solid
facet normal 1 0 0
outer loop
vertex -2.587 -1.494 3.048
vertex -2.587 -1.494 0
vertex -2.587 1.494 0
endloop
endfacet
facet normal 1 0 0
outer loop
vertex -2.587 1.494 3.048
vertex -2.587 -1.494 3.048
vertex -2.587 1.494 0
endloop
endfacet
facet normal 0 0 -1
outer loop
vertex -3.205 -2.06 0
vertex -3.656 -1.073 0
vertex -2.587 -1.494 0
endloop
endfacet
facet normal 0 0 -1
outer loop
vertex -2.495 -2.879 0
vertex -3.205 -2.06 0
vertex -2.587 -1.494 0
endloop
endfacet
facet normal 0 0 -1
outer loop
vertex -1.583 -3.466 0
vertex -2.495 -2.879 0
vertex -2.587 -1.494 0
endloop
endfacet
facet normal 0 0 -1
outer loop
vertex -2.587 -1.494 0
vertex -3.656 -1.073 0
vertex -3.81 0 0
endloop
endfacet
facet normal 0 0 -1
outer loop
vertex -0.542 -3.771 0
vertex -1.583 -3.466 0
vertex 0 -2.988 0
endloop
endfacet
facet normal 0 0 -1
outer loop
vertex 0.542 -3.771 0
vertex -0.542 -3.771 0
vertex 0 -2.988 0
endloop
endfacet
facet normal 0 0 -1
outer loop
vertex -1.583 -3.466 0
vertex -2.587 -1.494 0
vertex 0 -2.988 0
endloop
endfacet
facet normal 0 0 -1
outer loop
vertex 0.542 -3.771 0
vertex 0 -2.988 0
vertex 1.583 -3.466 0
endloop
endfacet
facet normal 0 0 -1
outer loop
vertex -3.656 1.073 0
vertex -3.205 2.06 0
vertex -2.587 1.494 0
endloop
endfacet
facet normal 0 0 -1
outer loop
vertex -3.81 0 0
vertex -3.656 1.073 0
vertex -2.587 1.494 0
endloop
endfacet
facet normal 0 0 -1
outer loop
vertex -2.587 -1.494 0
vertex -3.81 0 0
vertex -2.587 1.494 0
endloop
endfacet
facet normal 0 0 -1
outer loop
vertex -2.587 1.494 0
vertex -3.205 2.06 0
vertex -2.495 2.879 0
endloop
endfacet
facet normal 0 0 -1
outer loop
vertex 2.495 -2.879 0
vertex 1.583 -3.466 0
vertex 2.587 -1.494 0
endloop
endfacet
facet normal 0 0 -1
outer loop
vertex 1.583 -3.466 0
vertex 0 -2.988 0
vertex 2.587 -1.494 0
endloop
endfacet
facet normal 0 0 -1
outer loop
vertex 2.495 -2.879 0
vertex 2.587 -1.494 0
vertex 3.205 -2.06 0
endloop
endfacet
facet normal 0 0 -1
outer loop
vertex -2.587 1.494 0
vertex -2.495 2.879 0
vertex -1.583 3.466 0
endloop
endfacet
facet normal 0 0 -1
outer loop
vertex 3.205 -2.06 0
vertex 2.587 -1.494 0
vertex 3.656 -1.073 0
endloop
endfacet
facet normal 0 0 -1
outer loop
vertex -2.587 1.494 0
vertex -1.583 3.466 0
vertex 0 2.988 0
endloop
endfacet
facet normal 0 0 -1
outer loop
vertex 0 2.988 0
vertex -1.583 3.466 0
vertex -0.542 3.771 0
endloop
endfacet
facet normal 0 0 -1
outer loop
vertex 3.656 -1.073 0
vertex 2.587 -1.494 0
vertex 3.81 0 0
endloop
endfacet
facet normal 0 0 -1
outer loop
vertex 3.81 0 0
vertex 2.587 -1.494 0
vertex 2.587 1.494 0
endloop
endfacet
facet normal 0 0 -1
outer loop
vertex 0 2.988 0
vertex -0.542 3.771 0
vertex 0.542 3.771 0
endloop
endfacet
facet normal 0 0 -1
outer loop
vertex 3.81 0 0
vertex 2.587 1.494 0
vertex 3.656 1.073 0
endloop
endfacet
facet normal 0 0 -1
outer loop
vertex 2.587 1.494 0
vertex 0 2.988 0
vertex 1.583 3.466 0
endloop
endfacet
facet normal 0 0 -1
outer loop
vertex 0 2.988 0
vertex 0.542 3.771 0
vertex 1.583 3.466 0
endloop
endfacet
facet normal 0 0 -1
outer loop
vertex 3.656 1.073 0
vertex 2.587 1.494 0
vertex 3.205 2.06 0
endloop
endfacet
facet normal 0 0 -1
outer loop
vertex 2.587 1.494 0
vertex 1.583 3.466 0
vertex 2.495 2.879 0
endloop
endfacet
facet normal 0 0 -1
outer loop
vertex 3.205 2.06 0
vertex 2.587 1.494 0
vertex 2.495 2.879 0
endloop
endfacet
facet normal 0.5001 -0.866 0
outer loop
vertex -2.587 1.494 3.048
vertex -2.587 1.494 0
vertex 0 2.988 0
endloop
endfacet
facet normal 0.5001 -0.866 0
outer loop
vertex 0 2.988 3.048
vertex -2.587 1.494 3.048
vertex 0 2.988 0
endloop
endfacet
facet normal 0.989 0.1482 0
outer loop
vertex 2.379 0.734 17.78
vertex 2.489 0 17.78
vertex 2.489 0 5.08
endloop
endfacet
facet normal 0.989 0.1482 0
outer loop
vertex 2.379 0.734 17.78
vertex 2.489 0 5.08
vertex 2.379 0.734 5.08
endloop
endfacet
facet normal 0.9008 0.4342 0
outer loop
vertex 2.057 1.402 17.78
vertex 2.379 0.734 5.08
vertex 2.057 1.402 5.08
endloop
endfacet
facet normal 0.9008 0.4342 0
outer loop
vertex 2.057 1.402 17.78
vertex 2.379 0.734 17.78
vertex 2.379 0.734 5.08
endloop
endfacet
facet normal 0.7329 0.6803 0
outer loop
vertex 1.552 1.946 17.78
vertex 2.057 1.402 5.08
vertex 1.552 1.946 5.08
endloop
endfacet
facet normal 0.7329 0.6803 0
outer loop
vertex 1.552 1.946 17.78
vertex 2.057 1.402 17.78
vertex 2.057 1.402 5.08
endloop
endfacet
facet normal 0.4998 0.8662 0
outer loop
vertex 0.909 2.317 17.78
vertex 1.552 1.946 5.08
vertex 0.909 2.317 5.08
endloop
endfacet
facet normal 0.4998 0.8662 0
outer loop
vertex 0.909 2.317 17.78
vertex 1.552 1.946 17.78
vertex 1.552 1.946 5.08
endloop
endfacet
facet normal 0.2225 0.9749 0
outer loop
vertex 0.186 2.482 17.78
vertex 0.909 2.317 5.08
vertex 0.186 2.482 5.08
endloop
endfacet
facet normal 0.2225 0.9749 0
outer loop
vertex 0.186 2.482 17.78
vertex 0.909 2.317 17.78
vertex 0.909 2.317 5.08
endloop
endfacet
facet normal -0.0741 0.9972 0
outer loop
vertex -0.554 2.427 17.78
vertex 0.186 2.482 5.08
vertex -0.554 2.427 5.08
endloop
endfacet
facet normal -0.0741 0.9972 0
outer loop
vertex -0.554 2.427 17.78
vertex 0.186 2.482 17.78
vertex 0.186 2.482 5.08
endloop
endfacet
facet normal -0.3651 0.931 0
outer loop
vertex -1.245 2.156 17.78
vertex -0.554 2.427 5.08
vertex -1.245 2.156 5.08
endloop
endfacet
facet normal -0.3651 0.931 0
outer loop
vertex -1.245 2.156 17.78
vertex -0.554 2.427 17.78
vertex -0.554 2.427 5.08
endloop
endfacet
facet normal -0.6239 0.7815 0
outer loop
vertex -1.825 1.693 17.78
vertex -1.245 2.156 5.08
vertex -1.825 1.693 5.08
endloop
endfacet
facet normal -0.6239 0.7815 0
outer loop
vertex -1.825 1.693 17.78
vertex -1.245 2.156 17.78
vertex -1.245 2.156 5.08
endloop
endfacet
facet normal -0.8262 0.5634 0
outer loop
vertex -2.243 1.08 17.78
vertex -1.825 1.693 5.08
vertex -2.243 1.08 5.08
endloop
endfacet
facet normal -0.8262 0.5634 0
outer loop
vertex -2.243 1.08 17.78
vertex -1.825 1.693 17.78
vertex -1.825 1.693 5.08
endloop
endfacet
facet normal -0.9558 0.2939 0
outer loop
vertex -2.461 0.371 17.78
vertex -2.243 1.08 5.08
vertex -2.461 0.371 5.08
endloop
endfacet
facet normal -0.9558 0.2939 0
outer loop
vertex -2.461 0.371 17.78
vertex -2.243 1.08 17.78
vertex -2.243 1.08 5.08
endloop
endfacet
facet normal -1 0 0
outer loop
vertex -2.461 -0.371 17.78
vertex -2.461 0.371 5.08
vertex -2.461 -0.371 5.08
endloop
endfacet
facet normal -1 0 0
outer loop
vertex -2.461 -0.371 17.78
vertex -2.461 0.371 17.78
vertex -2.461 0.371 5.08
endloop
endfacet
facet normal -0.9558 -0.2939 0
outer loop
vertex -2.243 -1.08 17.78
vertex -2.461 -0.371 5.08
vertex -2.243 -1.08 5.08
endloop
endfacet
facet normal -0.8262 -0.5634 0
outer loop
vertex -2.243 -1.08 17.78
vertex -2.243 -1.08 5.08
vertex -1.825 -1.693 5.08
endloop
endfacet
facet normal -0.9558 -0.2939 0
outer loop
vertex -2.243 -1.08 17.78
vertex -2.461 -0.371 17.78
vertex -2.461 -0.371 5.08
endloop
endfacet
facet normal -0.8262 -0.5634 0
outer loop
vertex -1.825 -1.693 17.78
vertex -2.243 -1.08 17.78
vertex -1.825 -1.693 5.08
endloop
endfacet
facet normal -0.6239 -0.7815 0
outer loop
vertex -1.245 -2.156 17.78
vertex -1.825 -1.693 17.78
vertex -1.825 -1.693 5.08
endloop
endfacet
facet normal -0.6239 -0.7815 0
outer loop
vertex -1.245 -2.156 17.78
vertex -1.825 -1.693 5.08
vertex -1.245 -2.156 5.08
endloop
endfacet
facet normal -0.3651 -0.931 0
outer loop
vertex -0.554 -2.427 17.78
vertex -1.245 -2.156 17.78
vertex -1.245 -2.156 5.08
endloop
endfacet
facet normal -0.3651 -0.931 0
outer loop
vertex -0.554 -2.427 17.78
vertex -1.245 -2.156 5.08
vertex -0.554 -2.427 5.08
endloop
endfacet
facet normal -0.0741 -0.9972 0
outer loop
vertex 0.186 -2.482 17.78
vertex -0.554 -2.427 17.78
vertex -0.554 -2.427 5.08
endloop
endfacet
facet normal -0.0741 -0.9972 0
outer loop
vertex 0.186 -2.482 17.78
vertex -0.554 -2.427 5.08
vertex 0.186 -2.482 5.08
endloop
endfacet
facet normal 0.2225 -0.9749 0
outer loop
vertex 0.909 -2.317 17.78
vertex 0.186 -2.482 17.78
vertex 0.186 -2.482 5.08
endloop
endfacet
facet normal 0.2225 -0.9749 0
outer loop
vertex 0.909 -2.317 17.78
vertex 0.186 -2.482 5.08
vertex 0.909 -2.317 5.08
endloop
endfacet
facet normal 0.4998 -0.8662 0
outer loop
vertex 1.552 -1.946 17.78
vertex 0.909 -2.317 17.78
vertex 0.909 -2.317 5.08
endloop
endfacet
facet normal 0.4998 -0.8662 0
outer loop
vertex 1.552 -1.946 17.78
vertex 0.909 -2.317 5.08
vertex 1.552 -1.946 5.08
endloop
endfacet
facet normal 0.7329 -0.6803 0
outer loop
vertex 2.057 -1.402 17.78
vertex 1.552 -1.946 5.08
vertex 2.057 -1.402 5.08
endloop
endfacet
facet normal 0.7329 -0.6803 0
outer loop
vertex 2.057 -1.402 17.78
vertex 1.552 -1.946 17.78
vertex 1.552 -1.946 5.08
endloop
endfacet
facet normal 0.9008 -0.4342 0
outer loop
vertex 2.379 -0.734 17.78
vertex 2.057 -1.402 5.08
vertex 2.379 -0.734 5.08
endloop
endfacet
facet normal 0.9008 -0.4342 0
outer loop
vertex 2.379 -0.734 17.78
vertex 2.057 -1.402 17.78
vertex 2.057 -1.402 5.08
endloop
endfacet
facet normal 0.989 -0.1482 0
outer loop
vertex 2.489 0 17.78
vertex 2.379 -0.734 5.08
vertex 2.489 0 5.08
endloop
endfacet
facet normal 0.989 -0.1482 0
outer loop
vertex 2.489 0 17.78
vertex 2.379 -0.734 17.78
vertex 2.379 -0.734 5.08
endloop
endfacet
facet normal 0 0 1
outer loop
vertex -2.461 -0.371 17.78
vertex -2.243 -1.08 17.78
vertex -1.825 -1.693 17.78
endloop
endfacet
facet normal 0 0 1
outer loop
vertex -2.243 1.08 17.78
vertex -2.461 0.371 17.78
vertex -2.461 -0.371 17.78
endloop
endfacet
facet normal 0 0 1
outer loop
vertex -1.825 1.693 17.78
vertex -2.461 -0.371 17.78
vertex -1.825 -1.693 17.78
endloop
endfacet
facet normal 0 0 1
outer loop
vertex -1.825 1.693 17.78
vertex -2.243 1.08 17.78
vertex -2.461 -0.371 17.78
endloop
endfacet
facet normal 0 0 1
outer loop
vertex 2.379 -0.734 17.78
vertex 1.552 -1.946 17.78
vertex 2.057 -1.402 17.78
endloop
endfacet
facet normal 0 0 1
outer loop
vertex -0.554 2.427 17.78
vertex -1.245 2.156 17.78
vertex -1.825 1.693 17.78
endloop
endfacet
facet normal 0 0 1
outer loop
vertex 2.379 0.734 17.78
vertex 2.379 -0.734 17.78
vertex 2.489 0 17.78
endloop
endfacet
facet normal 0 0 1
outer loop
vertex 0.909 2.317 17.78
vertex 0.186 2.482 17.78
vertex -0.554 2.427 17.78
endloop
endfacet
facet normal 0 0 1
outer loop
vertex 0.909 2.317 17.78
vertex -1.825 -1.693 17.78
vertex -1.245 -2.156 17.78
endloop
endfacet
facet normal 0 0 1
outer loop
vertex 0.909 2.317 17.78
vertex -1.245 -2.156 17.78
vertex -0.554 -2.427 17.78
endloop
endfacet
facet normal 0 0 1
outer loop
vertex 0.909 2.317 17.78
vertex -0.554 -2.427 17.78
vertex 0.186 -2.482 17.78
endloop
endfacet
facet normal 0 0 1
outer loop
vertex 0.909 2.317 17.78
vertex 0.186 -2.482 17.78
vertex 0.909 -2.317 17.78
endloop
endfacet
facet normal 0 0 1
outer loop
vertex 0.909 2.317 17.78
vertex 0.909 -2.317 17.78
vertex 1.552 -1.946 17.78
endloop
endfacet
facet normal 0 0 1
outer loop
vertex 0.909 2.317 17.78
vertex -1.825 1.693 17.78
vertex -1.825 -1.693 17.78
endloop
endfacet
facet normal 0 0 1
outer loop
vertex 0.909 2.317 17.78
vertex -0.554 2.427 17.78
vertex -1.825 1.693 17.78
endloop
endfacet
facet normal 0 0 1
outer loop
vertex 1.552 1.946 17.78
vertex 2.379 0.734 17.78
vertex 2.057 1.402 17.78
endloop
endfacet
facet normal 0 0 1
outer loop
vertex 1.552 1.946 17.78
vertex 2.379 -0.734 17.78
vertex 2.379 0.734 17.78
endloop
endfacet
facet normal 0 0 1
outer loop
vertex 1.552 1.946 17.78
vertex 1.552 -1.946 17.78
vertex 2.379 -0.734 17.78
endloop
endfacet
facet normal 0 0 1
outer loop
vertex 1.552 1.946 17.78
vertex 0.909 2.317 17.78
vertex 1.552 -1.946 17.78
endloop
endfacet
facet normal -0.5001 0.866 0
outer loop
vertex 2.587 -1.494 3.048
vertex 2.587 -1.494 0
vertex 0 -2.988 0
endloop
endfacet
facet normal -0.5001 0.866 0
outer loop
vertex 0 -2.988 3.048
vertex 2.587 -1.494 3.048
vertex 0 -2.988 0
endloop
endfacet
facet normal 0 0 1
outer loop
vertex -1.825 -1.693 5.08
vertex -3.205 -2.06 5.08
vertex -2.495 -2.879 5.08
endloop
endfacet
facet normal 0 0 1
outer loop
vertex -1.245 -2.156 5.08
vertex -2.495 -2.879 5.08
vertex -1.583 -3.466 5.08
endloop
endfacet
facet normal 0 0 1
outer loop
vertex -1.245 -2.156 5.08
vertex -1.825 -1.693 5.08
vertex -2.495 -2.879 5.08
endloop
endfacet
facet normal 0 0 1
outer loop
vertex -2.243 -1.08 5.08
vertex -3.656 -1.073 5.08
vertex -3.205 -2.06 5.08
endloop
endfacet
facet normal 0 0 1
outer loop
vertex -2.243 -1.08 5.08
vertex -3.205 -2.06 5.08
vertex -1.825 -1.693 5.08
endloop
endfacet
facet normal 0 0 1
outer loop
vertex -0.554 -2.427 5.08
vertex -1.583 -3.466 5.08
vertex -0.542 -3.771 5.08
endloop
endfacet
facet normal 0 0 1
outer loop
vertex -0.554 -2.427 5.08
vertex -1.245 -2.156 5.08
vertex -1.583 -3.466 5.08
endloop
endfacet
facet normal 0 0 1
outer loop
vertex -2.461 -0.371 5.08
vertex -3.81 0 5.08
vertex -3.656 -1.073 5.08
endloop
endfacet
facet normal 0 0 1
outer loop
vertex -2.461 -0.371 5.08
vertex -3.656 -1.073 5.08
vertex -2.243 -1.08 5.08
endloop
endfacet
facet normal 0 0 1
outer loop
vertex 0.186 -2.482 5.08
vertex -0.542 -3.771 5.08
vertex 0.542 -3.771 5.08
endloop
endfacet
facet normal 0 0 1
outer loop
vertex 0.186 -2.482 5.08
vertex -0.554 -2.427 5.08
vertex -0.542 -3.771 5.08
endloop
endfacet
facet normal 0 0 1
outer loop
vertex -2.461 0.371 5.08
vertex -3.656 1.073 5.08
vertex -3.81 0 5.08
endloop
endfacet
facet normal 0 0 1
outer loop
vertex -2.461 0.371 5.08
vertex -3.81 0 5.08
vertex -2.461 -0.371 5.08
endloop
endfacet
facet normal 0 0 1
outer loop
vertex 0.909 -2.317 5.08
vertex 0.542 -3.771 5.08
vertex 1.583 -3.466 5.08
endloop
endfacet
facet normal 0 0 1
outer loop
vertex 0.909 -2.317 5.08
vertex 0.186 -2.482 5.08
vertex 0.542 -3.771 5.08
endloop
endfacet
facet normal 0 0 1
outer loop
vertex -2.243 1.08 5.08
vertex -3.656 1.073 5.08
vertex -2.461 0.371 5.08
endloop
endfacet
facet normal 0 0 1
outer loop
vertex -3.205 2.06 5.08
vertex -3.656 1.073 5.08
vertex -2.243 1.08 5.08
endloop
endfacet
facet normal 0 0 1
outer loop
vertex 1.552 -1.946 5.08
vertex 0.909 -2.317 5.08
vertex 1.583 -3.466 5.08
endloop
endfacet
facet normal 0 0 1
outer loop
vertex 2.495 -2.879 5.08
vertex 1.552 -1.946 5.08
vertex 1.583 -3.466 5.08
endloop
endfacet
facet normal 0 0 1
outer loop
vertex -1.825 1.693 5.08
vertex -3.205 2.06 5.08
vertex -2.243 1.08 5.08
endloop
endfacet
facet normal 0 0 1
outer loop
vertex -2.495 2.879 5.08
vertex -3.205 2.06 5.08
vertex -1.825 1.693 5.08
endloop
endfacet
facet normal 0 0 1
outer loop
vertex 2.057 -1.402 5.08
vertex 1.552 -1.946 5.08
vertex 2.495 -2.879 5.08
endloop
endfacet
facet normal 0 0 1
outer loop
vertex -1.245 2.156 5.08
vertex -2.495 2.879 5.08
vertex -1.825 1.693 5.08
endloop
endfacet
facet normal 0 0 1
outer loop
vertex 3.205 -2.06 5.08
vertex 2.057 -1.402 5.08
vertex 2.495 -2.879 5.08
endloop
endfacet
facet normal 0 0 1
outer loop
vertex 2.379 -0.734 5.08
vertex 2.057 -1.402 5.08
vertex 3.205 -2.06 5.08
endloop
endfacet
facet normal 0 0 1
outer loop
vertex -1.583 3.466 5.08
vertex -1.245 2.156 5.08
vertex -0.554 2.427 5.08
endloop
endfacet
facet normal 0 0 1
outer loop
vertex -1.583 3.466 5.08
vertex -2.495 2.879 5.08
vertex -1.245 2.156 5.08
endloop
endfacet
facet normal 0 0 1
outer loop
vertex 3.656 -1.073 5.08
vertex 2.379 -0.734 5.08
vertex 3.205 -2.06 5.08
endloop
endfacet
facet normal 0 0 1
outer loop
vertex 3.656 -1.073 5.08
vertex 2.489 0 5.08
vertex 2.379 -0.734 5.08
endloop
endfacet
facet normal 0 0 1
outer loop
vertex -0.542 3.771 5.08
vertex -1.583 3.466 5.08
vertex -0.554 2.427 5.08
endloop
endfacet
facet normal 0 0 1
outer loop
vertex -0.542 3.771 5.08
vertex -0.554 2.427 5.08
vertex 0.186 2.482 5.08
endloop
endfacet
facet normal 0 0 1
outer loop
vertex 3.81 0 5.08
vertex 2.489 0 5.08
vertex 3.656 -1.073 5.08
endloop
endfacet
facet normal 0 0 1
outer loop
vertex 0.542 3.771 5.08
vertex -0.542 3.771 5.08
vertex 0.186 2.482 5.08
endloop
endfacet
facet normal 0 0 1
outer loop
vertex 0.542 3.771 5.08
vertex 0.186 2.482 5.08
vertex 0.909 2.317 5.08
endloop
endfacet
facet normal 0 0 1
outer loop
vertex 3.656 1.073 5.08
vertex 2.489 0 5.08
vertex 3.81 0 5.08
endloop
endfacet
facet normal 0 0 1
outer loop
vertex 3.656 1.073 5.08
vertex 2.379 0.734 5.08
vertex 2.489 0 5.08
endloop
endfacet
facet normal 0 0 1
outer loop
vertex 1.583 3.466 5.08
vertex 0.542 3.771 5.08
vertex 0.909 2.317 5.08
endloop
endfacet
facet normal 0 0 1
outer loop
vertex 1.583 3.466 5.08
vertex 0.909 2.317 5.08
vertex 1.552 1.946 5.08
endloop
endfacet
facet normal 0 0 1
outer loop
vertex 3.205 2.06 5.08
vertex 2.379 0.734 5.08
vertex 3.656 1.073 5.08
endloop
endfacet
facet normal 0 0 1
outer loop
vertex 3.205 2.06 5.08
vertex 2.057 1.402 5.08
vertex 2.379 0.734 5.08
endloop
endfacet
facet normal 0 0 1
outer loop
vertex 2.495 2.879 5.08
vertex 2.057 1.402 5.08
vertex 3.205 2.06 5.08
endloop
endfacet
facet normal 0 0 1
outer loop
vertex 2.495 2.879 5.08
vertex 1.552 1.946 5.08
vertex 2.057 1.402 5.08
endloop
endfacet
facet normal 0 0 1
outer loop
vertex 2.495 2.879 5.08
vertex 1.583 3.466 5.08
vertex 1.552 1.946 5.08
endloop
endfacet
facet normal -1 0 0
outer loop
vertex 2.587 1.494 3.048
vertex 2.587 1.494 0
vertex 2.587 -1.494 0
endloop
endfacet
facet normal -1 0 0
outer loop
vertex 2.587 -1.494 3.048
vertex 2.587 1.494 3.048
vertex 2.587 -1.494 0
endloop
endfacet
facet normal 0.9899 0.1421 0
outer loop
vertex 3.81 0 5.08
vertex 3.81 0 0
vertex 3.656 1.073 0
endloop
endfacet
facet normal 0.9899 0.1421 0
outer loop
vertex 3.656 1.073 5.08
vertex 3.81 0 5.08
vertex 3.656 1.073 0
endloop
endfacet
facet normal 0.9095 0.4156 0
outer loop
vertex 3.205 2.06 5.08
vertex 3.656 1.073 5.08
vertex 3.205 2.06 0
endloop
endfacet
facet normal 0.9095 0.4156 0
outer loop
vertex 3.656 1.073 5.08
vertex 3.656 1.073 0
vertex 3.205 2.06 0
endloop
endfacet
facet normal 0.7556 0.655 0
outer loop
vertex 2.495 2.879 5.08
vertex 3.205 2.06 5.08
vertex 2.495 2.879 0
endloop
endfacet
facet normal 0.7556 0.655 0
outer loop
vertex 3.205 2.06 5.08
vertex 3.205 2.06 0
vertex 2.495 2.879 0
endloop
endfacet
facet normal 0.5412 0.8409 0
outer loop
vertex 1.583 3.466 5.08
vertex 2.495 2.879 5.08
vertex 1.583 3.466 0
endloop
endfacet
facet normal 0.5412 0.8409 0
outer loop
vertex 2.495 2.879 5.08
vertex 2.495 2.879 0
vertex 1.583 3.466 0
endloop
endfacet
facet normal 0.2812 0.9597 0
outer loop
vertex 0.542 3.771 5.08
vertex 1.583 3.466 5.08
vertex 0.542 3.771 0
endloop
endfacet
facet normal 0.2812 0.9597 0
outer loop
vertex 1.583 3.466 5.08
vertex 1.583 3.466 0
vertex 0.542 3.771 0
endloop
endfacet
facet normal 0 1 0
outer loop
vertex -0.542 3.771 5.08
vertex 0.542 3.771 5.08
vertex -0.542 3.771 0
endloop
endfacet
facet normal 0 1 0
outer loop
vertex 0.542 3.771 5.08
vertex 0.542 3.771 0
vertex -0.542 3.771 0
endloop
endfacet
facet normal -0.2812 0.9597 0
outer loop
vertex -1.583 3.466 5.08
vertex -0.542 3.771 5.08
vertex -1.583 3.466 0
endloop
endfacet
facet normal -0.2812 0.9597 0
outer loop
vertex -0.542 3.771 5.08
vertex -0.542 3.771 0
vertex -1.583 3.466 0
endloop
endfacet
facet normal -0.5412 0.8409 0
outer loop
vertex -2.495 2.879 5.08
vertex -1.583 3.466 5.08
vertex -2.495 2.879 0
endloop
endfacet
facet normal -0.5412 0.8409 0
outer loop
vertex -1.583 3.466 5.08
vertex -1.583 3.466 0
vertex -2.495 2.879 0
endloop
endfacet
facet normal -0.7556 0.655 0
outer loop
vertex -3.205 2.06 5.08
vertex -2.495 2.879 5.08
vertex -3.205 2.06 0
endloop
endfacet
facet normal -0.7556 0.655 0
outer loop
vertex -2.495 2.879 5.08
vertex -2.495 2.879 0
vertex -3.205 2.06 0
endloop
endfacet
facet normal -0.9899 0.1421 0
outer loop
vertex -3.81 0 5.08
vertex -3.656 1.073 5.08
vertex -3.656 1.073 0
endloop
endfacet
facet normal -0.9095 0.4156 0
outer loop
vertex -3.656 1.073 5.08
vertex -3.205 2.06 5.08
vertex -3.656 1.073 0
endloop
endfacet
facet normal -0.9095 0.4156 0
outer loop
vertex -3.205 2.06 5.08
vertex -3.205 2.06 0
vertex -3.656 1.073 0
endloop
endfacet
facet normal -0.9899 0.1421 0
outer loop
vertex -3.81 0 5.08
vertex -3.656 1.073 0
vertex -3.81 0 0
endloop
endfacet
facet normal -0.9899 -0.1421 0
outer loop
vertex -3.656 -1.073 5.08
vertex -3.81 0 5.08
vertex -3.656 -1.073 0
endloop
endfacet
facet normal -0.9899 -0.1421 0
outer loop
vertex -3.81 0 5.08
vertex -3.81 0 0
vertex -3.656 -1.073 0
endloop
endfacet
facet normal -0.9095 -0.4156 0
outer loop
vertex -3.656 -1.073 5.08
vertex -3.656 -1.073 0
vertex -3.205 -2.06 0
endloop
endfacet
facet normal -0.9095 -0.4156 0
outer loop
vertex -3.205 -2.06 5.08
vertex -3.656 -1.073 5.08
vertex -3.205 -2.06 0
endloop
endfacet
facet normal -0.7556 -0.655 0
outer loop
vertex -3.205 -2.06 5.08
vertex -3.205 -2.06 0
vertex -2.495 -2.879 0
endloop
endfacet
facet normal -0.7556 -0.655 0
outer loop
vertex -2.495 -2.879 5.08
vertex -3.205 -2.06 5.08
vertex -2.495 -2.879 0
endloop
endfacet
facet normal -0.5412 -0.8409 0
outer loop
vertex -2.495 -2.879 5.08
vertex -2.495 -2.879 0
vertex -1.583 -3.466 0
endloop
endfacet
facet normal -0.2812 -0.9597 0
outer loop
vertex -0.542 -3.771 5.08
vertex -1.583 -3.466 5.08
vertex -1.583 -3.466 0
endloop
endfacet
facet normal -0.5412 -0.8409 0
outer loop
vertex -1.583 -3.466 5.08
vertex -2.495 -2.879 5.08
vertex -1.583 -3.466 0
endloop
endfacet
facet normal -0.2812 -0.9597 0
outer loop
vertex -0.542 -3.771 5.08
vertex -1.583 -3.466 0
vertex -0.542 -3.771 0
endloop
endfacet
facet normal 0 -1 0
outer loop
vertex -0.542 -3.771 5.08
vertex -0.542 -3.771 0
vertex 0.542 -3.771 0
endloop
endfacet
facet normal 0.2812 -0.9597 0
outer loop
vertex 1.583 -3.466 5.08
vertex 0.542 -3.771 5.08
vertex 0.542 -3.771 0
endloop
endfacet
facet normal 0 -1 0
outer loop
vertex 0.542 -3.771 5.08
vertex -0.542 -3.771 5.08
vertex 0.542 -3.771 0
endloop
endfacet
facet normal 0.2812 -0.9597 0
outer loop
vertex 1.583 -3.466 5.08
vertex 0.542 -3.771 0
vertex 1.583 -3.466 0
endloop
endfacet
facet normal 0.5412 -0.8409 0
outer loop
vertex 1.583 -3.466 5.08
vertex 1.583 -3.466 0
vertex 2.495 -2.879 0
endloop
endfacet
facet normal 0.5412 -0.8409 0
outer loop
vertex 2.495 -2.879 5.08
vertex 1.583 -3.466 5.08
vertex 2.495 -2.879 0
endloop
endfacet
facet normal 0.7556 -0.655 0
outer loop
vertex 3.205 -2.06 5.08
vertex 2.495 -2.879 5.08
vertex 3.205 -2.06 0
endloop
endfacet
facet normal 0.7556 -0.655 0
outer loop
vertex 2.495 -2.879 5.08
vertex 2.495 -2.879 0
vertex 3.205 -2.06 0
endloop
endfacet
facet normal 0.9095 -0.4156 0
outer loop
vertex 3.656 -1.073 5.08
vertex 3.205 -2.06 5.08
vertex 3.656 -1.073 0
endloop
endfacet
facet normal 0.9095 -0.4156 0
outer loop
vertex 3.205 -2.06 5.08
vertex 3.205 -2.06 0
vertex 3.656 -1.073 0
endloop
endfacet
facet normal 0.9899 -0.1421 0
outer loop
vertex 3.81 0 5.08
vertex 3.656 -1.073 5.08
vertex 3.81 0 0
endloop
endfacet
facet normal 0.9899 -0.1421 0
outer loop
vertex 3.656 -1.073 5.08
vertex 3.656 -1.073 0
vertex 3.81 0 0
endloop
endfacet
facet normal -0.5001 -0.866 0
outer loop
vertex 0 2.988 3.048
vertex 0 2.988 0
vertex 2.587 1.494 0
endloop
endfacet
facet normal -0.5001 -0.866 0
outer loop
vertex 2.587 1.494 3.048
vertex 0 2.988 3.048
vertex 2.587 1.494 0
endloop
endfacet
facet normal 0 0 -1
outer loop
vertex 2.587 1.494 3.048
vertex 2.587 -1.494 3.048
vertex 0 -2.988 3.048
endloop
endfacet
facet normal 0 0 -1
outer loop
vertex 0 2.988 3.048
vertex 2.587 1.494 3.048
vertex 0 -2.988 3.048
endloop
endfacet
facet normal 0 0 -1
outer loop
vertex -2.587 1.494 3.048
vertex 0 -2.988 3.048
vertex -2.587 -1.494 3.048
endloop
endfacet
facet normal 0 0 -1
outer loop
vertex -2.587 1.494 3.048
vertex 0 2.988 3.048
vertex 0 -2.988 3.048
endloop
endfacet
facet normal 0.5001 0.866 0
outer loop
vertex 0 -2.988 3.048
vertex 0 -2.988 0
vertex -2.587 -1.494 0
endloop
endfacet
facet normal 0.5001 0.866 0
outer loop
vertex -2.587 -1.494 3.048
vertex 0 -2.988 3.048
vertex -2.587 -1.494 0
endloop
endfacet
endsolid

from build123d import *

# Parameters (mm, degrees)
SKETCH1_R         = 3.81
EXTRUDE1_DEPTH    = 17.78
SKETCH2_OUTSIDE_W = 13.778
SKETCH2_OUTSIDE_H = 13.778
SKETCH2_OUTSIDE_R = 2.4892
EXTRUDE2_DEPTH    = 12.7
EXTRUDE3_DEPTH    = 3.048


with BuildPart() as part:
    # Sketch1 → Extrude1 (new body)
    with BuildSketch(Plane.XY):
        Circle(SKETCH1_R)
    extrude(amount=EXTRUDE1_DEPTH)

    # Sketch2 outside → Extrude2 (cut)
    with BuildSketch(Plane.XY.offset(17.78)):
        Rectangle(SKETCH2_OUTSIDE_W, SKETCH2_OUTSIDE_H)
        Circle(SKETCH2_OUTSIDE_R, mode=Mode.SUBTRACT)
    extrude(amount=-EXTRUDE2_DEPTH, mode=Mode.SUBTRACT)

    # Sketch3 → Extrude3 (cut)
    with BuildSketch(Plane(origin=(0, 0, 0), x_dir=(-1, 0, 0), z_dir=(0, 0, -1))):
        Polygon((0, 2.987683948), (-2.587410198, 1.493841974), (-2.587410198, -1.493841974), (0, -2.987683948), (2.587410198, -1.493841974), (2.587410198, 1.493841974), align=None)
    extrude(amount=-EXTRUDE3_DEPTH, mode=Mode.SUBTRACT)


solid = part.part
